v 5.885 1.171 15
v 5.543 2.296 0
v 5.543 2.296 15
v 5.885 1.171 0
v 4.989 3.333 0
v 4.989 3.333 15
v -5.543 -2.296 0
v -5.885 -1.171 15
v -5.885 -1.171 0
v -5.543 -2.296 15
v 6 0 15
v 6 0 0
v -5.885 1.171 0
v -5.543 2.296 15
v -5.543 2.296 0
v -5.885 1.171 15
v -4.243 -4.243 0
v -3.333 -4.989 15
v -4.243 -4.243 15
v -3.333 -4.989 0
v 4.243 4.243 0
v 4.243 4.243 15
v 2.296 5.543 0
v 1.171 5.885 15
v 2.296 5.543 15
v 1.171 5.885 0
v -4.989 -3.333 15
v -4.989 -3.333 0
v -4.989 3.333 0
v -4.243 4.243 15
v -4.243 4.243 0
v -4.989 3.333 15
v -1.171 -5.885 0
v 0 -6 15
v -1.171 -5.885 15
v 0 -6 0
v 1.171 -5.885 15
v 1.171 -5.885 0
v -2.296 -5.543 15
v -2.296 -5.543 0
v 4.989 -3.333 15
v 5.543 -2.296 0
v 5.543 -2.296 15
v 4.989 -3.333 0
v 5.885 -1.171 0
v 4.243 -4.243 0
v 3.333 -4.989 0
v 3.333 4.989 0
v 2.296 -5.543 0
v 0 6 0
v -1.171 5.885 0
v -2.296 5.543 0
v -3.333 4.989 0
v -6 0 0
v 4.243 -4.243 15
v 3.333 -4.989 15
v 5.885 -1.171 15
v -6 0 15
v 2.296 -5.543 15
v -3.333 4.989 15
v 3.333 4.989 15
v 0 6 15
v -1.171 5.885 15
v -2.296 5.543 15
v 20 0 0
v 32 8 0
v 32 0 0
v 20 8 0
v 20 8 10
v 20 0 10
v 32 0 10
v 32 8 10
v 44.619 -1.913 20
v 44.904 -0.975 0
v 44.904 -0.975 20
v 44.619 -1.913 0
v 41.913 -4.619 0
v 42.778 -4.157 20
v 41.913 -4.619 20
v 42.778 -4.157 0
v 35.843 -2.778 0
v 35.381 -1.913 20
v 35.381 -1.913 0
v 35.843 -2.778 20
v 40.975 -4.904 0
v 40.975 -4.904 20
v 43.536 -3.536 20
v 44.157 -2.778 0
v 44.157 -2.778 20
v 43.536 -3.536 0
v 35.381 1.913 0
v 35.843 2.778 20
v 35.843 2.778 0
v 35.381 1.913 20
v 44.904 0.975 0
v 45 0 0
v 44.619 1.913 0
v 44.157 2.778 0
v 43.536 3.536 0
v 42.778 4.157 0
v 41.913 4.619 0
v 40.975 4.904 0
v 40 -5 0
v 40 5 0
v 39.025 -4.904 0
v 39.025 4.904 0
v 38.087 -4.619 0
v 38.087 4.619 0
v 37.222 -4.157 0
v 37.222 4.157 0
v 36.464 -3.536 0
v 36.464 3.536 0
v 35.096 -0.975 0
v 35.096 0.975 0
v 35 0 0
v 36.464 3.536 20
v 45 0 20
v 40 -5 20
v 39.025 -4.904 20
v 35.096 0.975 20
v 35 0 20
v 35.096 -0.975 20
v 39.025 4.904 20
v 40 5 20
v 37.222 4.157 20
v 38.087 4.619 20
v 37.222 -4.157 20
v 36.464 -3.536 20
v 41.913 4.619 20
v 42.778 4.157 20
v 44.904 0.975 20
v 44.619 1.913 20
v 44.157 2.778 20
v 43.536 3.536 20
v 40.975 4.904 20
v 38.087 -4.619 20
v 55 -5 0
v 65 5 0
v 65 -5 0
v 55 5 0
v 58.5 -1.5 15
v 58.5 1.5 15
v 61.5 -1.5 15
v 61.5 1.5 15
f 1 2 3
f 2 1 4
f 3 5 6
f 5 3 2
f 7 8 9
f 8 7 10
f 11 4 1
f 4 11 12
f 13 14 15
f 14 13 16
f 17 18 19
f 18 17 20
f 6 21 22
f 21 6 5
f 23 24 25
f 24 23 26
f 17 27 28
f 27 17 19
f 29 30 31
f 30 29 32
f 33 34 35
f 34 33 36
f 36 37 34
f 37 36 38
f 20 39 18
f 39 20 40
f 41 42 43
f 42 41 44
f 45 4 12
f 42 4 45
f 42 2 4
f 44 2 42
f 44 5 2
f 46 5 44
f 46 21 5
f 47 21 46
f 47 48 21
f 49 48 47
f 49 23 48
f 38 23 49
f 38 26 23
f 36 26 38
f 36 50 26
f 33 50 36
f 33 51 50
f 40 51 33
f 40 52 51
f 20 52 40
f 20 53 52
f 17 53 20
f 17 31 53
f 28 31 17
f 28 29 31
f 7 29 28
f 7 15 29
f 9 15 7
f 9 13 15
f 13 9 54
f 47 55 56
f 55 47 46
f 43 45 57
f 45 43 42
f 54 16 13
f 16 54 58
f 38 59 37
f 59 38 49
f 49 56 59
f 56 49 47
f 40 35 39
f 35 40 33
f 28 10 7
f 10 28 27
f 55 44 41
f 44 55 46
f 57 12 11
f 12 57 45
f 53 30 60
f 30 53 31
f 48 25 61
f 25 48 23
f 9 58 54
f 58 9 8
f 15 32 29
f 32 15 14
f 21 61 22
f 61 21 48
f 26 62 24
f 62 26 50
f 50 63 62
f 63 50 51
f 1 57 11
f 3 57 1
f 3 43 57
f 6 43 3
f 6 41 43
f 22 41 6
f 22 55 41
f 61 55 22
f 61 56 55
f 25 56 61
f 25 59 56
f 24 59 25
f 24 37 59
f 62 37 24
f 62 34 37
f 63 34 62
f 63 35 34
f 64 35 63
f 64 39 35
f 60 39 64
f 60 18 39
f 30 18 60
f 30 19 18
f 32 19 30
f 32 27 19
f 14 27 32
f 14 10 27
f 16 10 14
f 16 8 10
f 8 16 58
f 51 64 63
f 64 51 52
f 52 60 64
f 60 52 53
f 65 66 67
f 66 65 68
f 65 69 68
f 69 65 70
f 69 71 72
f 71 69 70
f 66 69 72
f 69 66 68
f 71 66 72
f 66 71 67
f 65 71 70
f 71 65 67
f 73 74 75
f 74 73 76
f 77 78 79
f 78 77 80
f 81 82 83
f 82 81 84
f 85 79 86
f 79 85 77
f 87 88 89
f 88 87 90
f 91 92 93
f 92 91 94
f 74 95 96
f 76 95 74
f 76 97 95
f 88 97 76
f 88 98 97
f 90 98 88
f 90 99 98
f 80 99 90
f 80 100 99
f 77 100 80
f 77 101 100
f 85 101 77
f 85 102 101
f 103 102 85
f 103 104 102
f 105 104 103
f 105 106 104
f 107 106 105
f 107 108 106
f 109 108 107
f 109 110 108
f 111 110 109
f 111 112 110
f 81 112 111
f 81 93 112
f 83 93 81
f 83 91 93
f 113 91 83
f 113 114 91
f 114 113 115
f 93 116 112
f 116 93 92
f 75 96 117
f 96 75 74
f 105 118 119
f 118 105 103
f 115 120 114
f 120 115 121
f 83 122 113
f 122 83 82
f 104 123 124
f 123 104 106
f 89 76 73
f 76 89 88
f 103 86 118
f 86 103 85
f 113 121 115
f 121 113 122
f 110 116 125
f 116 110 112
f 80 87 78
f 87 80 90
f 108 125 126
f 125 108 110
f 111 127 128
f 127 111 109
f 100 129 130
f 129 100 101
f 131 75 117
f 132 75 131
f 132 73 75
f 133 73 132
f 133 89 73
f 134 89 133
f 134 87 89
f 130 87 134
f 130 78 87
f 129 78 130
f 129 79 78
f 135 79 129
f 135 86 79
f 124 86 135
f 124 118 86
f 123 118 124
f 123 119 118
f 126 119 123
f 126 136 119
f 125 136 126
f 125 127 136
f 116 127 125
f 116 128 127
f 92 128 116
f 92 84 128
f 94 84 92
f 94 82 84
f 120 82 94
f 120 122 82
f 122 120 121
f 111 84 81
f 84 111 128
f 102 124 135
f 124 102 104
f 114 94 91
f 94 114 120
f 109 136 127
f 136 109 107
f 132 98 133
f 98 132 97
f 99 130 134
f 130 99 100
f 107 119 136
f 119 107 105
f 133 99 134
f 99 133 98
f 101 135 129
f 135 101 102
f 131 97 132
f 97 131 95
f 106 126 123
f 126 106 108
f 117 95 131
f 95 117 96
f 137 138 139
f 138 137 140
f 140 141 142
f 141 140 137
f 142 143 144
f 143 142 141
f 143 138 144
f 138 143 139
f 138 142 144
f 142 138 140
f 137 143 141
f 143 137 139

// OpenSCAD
// TEST 06: linear_extrude with 2D shapes
// Expected: extruded circle = cylinder-like; extruded square = box.
// Check: height parameter in card matches code value.
// Check: twist/scale parameters in card (if shown).

$fn = 32;

// circle extruded — effectively a cylinder
translate([0, 0, 0]) {
    linear_extrude(height=15) {
        circle(r=6);
    }
}

// square extruded
translate([20, 0, 0]) {
    linear_extrude(height=10) {
        square([12, 8]);
    }
}

// circle extruded with twist
translate([40, 0, 0]) {
    linear_extrude(height=20, twist=90) {
        circle(r=5);
    }
}

// square extruded with scale taper
translate([60, 0, 0]) {
    linear_extrude(height=15, scale=0.3) {
        square([10, 10], center=true);
    }
}
